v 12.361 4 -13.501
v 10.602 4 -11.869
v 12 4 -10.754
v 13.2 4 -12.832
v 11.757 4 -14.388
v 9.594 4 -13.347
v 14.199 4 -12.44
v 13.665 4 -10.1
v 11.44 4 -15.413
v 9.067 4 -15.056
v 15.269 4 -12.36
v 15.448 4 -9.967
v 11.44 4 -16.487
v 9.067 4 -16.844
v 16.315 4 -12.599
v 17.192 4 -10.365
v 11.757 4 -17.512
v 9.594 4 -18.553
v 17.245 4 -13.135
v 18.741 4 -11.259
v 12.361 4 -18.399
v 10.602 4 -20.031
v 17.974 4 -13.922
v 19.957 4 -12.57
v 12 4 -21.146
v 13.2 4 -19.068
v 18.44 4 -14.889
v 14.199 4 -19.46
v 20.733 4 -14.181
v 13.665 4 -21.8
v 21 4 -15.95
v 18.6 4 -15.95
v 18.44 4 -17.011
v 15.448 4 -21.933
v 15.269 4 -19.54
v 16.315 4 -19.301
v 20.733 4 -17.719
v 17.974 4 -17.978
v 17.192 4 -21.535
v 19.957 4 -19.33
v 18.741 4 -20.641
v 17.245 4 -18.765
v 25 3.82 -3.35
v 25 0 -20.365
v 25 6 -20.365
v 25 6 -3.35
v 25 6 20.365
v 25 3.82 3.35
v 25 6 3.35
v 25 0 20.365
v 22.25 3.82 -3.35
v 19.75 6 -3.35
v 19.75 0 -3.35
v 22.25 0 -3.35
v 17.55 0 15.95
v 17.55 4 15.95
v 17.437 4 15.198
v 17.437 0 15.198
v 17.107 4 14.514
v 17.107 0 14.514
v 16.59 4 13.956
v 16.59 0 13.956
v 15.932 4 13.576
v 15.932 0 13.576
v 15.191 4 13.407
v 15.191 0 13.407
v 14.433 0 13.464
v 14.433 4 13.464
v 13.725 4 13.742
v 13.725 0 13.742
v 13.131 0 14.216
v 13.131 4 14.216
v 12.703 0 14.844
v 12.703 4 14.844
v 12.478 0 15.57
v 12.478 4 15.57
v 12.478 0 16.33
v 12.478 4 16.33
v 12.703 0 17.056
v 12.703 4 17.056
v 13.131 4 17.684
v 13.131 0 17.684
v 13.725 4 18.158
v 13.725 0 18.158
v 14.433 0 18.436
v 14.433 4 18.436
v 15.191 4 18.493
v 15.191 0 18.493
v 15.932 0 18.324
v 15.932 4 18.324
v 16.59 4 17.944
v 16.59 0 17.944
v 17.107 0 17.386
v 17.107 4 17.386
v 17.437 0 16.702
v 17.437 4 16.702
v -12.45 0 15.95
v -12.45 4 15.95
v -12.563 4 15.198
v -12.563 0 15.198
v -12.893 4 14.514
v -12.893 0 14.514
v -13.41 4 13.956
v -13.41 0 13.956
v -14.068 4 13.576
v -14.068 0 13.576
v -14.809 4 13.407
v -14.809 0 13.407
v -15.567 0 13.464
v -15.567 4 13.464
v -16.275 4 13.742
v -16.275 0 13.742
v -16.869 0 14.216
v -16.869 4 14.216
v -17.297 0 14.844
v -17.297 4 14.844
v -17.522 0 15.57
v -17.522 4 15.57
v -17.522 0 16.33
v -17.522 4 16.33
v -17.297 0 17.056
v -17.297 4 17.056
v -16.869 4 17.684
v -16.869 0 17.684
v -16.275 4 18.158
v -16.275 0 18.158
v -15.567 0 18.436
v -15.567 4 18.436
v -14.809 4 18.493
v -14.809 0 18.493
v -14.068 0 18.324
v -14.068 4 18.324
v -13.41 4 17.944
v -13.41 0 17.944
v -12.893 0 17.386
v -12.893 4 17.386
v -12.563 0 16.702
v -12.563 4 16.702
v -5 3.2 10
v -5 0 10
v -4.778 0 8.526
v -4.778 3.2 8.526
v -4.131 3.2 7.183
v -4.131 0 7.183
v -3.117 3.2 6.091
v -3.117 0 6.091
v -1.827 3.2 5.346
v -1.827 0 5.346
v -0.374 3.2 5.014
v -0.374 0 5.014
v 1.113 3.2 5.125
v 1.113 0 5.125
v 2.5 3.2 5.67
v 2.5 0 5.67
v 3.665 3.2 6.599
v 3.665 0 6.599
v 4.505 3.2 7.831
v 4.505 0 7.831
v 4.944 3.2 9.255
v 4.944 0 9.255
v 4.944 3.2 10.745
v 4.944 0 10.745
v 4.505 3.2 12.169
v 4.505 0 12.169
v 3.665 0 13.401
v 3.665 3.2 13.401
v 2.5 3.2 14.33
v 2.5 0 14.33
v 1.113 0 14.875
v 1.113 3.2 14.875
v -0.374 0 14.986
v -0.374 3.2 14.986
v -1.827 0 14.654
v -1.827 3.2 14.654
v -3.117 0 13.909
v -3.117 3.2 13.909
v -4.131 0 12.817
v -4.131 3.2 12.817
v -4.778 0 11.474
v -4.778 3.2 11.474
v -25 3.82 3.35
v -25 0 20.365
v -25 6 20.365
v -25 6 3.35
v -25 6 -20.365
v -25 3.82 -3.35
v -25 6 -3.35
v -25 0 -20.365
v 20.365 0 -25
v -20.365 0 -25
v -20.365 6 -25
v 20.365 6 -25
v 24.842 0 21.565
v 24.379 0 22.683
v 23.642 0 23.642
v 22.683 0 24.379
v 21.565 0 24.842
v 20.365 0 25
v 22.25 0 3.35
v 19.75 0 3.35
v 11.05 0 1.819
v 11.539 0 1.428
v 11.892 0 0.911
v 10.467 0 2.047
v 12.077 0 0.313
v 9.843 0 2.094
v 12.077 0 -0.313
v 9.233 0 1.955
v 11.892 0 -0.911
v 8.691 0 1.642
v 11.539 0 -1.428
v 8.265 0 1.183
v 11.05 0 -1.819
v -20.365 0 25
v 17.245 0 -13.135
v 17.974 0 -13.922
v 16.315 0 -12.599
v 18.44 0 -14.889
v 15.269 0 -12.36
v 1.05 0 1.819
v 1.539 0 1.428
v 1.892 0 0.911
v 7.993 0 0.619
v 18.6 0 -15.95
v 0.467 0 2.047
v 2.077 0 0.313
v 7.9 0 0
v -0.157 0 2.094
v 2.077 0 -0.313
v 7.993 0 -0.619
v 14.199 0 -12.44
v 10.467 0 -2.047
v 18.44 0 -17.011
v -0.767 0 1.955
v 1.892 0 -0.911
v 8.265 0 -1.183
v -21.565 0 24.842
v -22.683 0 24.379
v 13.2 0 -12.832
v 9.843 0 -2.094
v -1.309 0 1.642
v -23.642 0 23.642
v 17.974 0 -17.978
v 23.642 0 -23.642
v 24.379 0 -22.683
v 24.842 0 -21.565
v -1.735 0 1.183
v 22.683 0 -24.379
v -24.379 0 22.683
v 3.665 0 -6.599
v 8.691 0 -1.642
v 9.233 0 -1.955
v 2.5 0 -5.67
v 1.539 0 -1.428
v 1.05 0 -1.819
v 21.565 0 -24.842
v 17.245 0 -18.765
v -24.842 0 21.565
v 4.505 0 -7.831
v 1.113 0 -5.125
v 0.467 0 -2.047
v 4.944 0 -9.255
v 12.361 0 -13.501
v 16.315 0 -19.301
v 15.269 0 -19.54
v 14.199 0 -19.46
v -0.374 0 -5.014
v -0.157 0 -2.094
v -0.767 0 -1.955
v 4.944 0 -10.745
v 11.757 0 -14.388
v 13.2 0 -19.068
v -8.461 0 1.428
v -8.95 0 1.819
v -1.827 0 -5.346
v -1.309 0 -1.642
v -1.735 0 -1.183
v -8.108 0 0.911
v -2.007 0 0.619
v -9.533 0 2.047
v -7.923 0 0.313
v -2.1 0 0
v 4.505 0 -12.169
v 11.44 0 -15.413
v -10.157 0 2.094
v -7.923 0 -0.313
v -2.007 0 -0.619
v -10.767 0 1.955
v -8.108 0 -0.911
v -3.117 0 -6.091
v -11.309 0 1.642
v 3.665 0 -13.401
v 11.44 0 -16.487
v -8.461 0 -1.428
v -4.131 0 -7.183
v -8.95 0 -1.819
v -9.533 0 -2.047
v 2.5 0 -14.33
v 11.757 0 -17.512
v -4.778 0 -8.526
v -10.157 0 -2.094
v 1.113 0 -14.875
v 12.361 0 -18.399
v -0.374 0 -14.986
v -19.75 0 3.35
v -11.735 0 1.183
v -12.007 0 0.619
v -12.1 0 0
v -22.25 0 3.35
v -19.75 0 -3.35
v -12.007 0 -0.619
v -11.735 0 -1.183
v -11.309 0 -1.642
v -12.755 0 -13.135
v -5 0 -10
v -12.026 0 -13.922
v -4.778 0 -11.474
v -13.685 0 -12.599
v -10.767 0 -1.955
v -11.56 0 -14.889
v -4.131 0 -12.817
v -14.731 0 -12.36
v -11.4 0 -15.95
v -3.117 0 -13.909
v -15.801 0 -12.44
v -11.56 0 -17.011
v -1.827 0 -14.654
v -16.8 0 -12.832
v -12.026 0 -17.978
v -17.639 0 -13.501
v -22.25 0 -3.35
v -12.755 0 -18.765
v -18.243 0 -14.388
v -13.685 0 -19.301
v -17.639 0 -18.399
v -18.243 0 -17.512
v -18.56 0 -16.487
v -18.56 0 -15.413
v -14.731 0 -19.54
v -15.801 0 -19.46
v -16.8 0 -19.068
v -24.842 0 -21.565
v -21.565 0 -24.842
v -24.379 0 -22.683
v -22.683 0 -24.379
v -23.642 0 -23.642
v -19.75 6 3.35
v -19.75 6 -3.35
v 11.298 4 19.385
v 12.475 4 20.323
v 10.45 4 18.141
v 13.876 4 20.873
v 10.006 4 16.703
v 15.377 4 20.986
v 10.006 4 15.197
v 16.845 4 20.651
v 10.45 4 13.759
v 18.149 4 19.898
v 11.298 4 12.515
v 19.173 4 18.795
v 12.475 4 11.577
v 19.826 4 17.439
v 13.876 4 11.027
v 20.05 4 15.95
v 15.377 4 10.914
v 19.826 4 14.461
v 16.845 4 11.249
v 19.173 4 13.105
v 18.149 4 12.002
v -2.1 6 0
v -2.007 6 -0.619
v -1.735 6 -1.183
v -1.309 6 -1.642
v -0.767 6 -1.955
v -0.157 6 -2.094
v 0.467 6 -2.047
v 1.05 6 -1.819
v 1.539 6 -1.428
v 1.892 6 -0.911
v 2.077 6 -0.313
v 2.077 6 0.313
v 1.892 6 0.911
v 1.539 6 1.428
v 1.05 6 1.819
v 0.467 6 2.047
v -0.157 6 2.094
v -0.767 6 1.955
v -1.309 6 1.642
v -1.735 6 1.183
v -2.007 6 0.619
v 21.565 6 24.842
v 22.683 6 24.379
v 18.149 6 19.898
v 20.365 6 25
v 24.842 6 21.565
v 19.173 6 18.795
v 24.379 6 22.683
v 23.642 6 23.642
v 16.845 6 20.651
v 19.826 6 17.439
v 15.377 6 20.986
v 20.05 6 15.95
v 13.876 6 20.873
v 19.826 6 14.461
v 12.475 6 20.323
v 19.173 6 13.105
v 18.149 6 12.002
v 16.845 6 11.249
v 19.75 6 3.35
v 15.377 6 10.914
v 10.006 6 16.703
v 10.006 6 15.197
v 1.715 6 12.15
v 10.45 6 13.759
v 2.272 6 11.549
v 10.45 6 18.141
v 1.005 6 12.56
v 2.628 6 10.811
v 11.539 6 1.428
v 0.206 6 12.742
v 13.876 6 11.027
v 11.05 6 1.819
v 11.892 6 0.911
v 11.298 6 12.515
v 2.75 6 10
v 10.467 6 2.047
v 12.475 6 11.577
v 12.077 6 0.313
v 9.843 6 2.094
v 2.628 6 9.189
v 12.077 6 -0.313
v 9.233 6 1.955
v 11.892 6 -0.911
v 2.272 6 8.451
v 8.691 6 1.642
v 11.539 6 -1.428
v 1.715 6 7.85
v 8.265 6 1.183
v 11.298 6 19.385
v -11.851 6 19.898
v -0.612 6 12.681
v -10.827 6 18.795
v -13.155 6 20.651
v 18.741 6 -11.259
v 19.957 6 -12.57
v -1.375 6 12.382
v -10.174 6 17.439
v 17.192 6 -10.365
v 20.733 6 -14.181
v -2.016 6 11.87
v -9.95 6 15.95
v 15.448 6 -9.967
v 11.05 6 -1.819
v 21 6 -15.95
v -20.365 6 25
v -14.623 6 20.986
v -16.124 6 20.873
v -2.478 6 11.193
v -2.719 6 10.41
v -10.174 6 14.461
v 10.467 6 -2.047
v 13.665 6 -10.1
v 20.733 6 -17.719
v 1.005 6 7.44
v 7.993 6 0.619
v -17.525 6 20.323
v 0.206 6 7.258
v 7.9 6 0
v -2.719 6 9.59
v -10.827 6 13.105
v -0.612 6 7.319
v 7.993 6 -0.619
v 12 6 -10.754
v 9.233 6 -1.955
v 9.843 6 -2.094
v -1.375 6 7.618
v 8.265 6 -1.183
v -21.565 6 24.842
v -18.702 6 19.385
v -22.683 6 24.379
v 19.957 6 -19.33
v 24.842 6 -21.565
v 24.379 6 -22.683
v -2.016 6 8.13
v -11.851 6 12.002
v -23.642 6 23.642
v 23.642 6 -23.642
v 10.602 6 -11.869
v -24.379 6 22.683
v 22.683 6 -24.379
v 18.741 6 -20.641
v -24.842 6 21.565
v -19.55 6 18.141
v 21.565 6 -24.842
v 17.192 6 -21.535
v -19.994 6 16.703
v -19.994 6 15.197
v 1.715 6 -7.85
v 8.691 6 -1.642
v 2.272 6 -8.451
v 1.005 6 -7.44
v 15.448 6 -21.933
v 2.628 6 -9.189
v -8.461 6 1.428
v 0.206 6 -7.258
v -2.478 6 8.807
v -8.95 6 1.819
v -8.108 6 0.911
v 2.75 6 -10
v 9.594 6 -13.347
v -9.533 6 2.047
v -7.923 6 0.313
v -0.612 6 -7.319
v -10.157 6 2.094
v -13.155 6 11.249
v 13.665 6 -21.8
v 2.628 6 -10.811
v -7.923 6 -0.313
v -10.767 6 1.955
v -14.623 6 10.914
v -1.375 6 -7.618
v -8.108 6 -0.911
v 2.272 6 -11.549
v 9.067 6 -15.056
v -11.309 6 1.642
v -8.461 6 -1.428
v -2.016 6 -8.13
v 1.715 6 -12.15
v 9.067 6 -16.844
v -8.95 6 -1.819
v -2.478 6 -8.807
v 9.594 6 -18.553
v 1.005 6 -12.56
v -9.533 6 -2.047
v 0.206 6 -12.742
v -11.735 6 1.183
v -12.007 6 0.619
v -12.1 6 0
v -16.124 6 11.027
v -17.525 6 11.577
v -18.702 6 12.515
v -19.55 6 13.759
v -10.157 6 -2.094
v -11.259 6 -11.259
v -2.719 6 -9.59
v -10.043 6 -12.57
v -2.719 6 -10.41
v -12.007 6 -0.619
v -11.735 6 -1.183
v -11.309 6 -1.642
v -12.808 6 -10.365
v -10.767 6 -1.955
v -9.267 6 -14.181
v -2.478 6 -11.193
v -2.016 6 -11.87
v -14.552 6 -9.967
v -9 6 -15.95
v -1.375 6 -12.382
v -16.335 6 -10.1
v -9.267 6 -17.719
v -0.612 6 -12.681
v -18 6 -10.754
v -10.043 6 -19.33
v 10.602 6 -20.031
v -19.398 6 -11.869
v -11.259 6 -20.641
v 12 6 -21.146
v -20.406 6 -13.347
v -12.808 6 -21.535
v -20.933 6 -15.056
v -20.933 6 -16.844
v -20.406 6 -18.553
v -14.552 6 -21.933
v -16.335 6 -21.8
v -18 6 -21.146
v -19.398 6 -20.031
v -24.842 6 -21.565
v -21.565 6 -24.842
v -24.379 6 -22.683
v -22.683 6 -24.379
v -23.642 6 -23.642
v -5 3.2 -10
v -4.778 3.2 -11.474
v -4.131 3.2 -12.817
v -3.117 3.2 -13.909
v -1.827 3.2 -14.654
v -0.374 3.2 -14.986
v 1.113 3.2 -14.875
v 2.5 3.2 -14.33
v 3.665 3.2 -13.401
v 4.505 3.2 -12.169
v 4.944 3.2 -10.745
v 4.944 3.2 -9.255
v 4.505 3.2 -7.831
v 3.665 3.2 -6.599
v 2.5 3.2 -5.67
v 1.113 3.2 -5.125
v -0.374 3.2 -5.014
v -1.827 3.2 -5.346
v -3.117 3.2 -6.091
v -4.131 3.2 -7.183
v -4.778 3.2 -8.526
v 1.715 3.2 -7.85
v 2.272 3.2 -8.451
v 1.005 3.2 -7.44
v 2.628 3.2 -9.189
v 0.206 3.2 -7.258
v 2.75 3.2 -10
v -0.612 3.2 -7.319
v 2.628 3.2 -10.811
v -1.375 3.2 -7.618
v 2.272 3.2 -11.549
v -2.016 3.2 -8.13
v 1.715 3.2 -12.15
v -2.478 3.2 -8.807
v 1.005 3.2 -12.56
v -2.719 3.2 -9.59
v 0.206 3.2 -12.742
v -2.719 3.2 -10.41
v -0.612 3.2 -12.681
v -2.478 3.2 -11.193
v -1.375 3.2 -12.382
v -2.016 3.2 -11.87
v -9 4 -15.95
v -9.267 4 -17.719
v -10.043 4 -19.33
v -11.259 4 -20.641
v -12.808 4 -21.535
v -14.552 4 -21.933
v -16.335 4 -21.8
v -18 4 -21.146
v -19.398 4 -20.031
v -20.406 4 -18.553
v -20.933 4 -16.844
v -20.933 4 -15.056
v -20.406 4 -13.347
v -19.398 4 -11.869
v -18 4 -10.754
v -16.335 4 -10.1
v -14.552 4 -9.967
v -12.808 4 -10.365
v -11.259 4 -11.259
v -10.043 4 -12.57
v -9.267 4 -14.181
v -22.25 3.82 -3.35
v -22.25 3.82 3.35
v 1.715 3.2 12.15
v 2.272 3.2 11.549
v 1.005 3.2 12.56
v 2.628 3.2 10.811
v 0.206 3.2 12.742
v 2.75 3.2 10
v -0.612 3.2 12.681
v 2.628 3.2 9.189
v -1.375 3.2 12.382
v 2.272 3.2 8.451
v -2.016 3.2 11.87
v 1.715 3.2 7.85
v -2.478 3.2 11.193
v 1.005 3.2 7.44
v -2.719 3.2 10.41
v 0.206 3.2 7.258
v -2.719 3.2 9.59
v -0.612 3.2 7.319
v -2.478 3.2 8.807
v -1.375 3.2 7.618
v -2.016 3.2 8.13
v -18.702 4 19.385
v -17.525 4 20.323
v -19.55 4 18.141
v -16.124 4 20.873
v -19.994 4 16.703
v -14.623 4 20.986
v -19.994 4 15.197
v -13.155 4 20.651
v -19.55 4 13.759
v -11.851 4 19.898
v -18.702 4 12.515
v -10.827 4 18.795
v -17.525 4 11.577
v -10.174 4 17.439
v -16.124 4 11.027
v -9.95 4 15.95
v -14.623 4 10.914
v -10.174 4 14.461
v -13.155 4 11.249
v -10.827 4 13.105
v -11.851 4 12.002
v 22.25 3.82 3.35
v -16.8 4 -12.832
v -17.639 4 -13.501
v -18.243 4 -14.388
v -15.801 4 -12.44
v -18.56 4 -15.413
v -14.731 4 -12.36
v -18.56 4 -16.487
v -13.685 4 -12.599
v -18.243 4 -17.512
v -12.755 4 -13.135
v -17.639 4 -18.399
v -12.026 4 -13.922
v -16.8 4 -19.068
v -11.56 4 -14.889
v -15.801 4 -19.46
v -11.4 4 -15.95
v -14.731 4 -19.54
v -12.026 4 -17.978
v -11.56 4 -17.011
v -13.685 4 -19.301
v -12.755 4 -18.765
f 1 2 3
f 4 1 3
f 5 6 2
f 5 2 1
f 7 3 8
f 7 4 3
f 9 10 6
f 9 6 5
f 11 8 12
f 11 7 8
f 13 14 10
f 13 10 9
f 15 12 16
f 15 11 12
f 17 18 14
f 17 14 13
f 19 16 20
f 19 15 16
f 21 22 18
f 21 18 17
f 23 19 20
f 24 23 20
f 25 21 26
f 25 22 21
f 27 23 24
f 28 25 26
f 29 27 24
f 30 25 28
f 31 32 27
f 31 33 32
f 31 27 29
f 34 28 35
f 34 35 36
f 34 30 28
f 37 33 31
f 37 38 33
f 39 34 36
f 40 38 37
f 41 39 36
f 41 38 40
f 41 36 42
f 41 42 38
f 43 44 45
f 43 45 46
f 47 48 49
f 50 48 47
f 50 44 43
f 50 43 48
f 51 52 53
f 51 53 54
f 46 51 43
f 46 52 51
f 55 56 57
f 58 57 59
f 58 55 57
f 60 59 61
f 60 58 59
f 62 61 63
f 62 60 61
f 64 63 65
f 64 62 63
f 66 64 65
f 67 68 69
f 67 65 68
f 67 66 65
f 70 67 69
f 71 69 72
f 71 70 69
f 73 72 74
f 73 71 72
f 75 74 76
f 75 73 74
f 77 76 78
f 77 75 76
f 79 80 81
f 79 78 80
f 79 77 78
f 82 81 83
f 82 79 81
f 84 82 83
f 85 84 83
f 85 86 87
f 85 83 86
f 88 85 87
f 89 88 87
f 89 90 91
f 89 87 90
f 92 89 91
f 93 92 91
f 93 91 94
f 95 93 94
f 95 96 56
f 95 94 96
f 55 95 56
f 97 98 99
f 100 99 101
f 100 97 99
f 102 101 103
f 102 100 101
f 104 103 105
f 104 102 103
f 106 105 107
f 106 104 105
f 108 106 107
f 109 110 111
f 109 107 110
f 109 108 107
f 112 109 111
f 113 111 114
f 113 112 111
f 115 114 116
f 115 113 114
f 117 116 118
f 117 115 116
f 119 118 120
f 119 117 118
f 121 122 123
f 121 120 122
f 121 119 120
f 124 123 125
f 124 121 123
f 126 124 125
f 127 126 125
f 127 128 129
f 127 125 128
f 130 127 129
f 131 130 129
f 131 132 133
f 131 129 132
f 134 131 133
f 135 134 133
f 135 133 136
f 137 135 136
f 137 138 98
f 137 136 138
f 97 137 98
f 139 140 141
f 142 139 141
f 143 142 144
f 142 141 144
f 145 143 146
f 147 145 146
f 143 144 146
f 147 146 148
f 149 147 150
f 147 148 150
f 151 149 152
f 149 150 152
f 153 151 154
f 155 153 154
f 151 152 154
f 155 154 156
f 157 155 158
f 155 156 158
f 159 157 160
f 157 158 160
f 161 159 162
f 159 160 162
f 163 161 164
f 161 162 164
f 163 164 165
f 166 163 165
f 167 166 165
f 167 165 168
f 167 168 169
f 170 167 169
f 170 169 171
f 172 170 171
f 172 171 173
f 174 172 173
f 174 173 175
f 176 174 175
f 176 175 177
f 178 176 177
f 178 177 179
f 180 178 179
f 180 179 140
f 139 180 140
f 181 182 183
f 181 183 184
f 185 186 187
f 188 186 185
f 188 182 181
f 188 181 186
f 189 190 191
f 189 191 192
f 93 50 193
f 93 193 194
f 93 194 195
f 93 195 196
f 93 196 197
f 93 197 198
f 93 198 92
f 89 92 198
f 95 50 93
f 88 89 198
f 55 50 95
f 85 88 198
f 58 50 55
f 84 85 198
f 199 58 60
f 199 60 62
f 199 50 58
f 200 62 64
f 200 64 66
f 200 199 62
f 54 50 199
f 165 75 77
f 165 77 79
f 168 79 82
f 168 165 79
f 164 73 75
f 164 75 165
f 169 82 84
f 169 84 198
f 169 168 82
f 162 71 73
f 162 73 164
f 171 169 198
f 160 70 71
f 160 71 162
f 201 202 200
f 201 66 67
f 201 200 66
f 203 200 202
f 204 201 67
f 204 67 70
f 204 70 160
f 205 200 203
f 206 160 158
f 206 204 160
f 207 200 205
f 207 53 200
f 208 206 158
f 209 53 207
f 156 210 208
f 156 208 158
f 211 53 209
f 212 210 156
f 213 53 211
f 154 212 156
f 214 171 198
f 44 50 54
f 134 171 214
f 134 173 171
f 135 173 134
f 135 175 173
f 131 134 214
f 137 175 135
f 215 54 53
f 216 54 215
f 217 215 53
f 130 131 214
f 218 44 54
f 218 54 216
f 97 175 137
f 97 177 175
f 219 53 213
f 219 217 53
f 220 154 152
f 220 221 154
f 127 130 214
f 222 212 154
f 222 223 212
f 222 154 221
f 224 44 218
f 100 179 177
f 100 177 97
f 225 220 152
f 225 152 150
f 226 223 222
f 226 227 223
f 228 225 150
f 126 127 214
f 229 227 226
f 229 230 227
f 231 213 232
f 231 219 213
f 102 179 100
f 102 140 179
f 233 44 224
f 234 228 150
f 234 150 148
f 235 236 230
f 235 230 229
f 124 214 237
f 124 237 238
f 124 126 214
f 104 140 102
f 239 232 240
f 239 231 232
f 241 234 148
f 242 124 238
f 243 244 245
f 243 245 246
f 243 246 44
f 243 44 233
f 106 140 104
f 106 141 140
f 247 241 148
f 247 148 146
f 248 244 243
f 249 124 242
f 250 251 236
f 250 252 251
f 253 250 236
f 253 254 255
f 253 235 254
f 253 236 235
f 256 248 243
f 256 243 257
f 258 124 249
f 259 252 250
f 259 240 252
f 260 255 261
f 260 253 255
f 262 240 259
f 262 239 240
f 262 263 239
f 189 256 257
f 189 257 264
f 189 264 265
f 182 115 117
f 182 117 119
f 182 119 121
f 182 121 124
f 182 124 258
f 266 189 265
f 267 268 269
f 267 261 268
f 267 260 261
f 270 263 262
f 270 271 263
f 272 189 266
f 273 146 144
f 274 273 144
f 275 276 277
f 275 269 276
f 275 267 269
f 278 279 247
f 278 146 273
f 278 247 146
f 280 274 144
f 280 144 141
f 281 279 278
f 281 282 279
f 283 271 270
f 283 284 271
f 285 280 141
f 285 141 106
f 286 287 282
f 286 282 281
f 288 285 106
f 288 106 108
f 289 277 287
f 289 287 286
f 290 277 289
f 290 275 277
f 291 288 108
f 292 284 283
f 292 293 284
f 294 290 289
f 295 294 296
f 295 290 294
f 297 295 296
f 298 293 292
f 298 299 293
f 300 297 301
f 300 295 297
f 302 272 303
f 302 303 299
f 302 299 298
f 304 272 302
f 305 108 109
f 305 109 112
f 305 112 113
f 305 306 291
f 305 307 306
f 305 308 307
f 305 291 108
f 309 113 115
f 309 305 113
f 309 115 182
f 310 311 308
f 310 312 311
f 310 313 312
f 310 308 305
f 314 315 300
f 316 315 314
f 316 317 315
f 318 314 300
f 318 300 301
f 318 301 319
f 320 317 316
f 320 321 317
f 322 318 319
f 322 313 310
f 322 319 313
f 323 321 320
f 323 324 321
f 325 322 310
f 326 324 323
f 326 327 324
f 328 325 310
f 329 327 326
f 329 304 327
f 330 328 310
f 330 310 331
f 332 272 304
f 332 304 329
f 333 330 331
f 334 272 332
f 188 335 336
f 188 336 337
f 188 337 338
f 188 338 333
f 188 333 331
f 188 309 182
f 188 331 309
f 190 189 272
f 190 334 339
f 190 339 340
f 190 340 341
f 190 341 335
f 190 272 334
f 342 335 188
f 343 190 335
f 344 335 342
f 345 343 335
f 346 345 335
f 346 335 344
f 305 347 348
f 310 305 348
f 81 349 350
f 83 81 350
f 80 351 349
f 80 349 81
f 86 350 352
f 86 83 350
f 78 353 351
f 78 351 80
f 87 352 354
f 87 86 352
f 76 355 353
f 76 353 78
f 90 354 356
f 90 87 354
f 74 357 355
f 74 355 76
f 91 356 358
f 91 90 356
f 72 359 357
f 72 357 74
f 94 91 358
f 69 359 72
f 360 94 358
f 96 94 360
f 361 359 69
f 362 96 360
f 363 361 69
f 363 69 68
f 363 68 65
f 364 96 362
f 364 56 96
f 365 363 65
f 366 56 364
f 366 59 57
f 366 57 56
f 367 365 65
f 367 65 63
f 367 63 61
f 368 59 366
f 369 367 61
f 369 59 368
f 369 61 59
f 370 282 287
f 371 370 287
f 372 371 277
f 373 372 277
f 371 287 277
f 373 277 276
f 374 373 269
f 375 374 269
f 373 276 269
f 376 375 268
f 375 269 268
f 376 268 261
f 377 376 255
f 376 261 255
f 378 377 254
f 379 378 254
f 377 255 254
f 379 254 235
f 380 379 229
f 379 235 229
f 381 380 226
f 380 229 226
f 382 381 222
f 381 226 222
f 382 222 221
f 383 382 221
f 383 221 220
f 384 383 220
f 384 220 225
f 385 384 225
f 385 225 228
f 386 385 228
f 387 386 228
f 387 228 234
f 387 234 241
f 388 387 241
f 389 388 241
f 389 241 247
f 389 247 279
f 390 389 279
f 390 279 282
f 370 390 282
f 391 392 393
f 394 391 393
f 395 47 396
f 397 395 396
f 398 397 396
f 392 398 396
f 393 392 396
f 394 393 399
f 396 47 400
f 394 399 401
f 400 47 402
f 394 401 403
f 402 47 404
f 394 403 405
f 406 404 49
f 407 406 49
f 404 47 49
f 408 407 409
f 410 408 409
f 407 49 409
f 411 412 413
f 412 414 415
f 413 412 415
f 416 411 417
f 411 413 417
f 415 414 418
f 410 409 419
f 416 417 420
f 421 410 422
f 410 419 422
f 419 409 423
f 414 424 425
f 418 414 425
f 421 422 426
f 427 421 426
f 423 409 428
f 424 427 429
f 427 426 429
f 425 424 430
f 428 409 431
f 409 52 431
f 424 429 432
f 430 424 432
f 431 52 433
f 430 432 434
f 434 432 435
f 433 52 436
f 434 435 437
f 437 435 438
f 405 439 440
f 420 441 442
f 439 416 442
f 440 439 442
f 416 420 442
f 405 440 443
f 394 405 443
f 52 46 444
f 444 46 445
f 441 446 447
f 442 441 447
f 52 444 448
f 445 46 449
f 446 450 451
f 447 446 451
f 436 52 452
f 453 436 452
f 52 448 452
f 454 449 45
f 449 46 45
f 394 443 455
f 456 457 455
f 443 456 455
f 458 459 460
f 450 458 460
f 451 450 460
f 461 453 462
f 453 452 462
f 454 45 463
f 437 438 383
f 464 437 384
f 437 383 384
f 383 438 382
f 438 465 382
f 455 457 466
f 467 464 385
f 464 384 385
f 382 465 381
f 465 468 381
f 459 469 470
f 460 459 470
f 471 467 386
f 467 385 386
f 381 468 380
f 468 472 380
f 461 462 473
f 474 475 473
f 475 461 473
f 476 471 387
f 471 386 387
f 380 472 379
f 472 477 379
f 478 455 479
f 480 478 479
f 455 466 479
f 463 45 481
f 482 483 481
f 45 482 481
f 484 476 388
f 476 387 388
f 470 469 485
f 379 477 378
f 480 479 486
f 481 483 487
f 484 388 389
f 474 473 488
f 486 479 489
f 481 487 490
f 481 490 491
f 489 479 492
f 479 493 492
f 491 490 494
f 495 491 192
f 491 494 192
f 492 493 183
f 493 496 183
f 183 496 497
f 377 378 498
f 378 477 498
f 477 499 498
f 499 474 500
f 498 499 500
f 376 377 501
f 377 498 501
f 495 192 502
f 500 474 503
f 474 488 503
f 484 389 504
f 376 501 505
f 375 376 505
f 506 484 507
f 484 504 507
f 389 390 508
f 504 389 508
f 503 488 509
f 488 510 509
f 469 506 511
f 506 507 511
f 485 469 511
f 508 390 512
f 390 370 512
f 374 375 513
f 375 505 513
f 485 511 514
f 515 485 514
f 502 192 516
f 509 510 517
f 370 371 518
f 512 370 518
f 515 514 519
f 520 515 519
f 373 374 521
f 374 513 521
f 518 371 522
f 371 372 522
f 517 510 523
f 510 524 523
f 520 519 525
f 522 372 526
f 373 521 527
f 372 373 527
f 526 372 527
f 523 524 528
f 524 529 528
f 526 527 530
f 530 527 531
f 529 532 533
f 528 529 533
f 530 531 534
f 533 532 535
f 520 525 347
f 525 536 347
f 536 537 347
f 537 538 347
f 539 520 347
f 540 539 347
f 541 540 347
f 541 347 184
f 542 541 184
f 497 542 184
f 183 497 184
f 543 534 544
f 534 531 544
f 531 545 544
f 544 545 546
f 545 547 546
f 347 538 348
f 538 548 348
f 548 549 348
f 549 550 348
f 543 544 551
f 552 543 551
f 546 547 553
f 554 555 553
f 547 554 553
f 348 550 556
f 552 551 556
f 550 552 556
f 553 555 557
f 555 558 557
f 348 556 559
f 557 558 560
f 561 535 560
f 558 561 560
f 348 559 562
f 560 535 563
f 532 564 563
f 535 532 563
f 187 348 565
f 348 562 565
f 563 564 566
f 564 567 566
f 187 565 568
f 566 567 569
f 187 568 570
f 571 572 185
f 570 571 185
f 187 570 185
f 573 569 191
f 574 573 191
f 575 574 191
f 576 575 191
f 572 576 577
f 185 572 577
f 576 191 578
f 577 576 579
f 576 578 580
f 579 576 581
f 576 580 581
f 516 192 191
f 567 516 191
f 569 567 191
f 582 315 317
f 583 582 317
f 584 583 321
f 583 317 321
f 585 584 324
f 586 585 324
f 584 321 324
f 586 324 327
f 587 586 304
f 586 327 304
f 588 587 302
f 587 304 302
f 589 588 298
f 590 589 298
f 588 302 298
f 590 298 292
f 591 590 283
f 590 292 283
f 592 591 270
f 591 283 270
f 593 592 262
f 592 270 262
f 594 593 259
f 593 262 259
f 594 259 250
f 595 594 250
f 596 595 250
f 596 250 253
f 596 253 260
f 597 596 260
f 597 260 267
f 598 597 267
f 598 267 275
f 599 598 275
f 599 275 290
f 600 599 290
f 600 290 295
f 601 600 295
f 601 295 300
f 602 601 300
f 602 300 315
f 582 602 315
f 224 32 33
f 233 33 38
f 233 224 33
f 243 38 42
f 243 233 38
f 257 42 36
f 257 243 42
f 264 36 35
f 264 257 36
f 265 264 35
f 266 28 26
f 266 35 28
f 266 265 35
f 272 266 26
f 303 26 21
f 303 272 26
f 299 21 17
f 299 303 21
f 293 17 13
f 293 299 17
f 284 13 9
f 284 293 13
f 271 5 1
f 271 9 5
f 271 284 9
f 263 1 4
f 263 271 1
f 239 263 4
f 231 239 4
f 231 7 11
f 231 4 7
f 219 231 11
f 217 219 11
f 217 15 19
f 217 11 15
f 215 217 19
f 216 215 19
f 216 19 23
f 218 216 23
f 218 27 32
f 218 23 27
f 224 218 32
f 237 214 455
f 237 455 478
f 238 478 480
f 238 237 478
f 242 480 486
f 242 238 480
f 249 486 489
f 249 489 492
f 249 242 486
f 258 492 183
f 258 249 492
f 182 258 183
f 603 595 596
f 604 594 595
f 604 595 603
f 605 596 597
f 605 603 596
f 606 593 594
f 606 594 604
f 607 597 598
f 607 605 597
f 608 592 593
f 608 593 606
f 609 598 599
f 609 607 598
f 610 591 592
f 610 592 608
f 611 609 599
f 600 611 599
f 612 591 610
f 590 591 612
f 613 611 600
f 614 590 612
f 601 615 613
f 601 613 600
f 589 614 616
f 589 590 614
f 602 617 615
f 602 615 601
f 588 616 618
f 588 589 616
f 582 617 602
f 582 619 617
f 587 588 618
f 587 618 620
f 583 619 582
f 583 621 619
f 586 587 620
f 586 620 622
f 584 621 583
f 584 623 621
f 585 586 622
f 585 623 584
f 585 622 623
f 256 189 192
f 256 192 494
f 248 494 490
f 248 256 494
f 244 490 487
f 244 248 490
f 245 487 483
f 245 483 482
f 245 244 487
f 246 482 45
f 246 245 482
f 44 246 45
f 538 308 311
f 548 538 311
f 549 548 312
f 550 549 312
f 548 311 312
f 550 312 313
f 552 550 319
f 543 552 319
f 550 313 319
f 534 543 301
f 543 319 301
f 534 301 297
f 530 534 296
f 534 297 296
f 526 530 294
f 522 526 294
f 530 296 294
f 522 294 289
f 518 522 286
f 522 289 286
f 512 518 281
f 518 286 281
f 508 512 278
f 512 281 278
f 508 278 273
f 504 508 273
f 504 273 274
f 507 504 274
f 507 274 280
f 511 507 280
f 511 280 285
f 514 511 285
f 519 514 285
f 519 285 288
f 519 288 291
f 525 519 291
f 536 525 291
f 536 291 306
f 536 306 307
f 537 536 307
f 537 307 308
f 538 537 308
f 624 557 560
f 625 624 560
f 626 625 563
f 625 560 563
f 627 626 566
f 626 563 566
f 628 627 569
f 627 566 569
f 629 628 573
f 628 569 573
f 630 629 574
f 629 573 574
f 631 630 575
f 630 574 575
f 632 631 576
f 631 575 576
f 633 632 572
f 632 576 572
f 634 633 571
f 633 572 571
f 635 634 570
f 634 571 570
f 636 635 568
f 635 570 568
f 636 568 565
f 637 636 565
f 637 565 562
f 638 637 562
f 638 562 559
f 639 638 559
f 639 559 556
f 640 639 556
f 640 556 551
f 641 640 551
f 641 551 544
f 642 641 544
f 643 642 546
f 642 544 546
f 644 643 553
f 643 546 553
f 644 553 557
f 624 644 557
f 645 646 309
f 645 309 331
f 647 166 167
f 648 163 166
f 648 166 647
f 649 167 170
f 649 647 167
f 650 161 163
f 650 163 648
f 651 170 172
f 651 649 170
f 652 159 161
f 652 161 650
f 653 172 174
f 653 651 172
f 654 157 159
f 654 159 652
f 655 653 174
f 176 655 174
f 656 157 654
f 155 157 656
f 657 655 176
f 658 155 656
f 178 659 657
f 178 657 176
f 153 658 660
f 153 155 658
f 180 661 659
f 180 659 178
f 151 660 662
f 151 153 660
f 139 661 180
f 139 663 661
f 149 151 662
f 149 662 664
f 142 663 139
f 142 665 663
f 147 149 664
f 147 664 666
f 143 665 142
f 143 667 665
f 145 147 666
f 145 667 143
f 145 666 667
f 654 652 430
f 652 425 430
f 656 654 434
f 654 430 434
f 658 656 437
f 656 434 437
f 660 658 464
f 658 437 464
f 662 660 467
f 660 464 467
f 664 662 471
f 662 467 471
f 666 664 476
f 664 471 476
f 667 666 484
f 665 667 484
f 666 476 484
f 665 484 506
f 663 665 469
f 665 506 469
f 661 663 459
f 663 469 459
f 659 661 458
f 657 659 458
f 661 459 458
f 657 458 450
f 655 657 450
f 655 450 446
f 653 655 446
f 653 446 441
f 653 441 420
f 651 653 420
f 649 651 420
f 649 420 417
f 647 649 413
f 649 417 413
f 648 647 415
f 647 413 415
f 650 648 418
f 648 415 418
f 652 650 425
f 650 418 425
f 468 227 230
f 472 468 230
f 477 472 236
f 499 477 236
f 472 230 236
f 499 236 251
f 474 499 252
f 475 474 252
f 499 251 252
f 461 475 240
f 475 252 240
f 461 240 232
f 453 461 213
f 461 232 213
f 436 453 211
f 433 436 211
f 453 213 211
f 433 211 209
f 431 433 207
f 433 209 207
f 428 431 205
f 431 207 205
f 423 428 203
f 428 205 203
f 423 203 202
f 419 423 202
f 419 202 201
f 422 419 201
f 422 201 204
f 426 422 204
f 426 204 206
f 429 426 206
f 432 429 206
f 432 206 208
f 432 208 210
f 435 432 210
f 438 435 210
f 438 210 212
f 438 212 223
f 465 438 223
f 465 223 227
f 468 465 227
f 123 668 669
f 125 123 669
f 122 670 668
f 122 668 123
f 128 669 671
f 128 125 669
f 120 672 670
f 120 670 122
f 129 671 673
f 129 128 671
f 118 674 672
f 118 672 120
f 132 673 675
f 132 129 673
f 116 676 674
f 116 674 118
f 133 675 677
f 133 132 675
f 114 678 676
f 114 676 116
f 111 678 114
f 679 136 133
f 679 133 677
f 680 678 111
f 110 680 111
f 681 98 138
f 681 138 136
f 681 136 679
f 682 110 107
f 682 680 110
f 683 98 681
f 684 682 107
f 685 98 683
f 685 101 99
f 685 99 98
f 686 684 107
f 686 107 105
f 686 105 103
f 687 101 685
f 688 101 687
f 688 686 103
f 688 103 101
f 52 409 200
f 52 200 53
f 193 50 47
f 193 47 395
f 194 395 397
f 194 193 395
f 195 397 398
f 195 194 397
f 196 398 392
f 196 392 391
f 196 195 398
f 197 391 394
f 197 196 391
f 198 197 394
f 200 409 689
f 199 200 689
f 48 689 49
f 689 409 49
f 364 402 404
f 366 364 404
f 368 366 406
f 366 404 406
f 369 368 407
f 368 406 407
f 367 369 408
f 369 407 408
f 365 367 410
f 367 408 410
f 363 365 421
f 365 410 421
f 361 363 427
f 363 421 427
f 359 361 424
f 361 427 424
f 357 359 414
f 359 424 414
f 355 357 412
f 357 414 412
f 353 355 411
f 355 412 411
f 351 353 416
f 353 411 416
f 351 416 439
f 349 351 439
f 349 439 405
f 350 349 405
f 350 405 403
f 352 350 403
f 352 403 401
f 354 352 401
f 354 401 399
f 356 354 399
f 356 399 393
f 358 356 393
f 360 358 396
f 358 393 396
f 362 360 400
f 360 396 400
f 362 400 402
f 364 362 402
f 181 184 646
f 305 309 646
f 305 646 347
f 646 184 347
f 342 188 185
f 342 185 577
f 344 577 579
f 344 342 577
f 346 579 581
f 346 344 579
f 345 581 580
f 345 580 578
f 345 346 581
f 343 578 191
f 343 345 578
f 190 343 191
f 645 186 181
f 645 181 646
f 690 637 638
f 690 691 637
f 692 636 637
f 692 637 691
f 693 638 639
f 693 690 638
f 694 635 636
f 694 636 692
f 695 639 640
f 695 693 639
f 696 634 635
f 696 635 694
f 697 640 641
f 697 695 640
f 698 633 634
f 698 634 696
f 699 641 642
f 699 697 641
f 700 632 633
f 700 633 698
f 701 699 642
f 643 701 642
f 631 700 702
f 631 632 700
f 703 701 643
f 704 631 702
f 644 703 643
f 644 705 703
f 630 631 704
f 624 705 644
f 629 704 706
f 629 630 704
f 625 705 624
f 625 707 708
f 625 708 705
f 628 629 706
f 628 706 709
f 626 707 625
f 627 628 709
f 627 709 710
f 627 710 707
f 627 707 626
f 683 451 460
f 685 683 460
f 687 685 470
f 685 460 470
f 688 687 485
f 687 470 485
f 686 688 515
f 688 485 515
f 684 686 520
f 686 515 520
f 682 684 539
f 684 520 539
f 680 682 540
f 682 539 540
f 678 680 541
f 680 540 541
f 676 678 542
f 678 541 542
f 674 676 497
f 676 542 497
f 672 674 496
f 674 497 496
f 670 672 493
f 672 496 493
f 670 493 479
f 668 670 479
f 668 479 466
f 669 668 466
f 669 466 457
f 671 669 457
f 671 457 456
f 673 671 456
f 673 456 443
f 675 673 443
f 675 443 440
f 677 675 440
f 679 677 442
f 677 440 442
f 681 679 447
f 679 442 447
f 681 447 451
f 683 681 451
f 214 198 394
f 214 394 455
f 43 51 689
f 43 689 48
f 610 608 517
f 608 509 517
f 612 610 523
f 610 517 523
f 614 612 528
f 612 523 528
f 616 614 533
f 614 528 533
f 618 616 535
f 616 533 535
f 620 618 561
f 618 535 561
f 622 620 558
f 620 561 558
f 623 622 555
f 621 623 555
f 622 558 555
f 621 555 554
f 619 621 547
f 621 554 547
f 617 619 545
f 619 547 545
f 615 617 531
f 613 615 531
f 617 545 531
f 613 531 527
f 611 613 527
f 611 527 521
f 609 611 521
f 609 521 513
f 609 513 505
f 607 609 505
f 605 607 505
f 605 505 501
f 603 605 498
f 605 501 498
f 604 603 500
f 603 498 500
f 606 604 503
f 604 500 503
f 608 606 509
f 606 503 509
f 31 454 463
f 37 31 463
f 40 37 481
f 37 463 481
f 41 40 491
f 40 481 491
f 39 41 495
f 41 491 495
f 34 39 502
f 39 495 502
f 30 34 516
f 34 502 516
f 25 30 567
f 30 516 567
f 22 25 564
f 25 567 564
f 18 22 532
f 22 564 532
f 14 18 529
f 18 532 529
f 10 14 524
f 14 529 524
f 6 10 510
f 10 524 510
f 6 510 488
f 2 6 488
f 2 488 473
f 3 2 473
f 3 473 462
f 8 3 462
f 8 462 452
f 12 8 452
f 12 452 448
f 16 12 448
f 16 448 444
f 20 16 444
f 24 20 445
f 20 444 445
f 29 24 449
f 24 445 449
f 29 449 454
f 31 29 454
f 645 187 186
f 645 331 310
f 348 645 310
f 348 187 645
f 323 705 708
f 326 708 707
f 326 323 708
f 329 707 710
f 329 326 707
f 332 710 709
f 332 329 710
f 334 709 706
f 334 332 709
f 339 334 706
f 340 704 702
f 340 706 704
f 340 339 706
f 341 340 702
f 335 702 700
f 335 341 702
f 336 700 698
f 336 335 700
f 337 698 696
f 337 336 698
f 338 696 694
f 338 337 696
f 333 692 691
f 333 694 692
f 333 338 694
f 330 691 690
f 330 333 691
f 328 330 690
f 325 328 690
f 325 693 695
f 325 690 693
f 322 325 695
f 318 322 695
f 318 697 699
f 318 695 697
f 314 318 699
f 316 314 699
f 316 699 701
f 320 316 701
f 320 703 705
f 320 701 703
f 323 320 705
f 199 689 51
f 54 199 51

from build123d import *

# Parameters (mm, degrees)
SKETCH1_R                      = 3.6
SKETCH1_R_2                    = 2.55
BOSS_EXTRUDE1_DEPTH            = 6
M5X0_8_TAPPED_HOLE1_D          = 4.2
SKETCH2_R                      = 6
SKETCH2_R_2                    = 5.05
CUT_EXTRUDE1_DEPTH             = 2
SKETCH5_W                      = 5.25
SKETCH5_H                      = 6.7
CUT_EXTRUDE2_DEPTH             = 2.18
SKETCH6_W                      = 2.5
SKETCH6_H                      = 6.7
CUT_EXTRUDE3_DEPTH             = 4.82
CBORE_FOR_M5_SHCS1_D           = 5.5
CBORE_FOR_M5_SHCS1_CBORE_D     = 10
CBORE_FOR_M5_SHCS1_CBORE_DEPTH = 3.2


with BuildPart() as part:
    # Sketch1 → Boss-Extrude1 (new body)
    with BuildSketch(Plane(origin=(0, 0, 0), x_dir=(1, 0, 0), z_dir=(0, 1, 0))):
        with BuildLine():
            Line((20.365, -25), (-20.365, -25))
            ThreePointArc((-20.365, -25), (-23.642439931, -23.642439931), (-25, -20.365))
            Line((-25, -20.365), (-25, 20.365))
            ThreePointArc((-25, 20.365), (-23.642439931, 23.642439931), (-20.365, 25))
            Line((-20.365, 25), (20.365, 25))
            ThreePointArc((20.365, 25), (23.642439931, 23.642439931), (25, 20.365))
            Line((25, 20.365), (25, -20.365))
            ThreePointArc((25, -20.365), (23.642439931, -23.642439931), (20.365, -25))
        make_face()
        with Locations((-15, 15.95)):
            Circle(SKETCH1_R, mode=Mode.SUBTRACT)
        with Locations((15, 15.95)):
            Circle(SKETCH1_R, mode=Mode.SUBTRACT)
        with Locations((15, -15.95)):
            Circle(SKETCH1_R_2, mode=Mode.SUBTRACT)
        with Locations((-15, -15.95)):
            Circle(SKETCH1_R_2, mode=Mode.SUBTRACT)
    extrude(amount=BOSS_EXTRUDE1_DEPTH)

    # M5x0.8 Tapped Hole1 (through all)
    with Locations(Plane(origin=(0, 6, 0), x_dir=(1, 0, 0), z_dir=(0, 1, 0))):
        with Locations((0, 10), (-10, 0), (0, 0), (0, -10), (10, 0)):
            Hole(M5X0_8_TAPPED_HOLE1_D / 2)

    # Sketch2 → Cut-Extrude1 (cut)
    with BuildSketch(Plane(origin=(0, 6, 0), x_dir=(1, 0, 0), z_dir=(0, 1, 0))):
        with Locations((-15, 15.95)):
            Circle(SKETCH2_R)
        with Locations((15, 15.95)):
            Circle(SKETCH2_R)
        with Locations((15, -15.95)):
            Circle(SKETCH2_R_2)
        with Locations((-15, -15.95)):
            Circle(SKETCH2_R_2)
    extrude(amount=-CUT_EXTRUDE1_DEPTH, mode=Mode.SUBTRACT)

    # Sketch5 → Cut-Extrude2 (cut)
    with BuildSketch(Plane(origin=(0, 6, 0), x_dir=(1, 0, 0), z_dir=(0, 1, 0))):
        with Locations((-22.375, 0)):
            Rectangle(SKETCH5_W, SKETCH5_H)
        with Locations((22.375, 0)):
            Rectangle(SKETCH5_W, SKETCH5_H)
    extrude(amount=-CUT_EXTRUDE2_DEPTH, mode=Mode.SUBTRACT)

    # Sketch6 → Cut-Extrude3 (cut, through all)
    with BuildSketch(Plane(origin=(0, 3.82, 0), x_dir=(1, 0, 0), z_dir=(0, 1, 0))):
        with Locations((-21, 0)):
            Rectangle(SKETCH6_W, SKETCH6_H)
        with Locations((21, 0)):
            Rectangle(SKETCH6_W, SKETCH6_H)
    extrude(amount=-CUT_EXTRUDE3_DEPTH, mode=Mode.SUBTRACT)

    # CBORE for M5 SHCS1 (through all)
    with Locations(Plane(origin=(0, 0, 0), x_dir=(-1, 0, 0), z_dir=(0, -1, 0))):
        with Locations((0, 10), (0, -10)):
            CounterBoreHole(CBORE_FOR_M5_SHCS1_D / 2, CBORE_FOR_M5_SHCS1_CBORE_D / 2, CBORE_FOR_M5_SHCS1_CBORE_DEPTH)


solid = part.part
